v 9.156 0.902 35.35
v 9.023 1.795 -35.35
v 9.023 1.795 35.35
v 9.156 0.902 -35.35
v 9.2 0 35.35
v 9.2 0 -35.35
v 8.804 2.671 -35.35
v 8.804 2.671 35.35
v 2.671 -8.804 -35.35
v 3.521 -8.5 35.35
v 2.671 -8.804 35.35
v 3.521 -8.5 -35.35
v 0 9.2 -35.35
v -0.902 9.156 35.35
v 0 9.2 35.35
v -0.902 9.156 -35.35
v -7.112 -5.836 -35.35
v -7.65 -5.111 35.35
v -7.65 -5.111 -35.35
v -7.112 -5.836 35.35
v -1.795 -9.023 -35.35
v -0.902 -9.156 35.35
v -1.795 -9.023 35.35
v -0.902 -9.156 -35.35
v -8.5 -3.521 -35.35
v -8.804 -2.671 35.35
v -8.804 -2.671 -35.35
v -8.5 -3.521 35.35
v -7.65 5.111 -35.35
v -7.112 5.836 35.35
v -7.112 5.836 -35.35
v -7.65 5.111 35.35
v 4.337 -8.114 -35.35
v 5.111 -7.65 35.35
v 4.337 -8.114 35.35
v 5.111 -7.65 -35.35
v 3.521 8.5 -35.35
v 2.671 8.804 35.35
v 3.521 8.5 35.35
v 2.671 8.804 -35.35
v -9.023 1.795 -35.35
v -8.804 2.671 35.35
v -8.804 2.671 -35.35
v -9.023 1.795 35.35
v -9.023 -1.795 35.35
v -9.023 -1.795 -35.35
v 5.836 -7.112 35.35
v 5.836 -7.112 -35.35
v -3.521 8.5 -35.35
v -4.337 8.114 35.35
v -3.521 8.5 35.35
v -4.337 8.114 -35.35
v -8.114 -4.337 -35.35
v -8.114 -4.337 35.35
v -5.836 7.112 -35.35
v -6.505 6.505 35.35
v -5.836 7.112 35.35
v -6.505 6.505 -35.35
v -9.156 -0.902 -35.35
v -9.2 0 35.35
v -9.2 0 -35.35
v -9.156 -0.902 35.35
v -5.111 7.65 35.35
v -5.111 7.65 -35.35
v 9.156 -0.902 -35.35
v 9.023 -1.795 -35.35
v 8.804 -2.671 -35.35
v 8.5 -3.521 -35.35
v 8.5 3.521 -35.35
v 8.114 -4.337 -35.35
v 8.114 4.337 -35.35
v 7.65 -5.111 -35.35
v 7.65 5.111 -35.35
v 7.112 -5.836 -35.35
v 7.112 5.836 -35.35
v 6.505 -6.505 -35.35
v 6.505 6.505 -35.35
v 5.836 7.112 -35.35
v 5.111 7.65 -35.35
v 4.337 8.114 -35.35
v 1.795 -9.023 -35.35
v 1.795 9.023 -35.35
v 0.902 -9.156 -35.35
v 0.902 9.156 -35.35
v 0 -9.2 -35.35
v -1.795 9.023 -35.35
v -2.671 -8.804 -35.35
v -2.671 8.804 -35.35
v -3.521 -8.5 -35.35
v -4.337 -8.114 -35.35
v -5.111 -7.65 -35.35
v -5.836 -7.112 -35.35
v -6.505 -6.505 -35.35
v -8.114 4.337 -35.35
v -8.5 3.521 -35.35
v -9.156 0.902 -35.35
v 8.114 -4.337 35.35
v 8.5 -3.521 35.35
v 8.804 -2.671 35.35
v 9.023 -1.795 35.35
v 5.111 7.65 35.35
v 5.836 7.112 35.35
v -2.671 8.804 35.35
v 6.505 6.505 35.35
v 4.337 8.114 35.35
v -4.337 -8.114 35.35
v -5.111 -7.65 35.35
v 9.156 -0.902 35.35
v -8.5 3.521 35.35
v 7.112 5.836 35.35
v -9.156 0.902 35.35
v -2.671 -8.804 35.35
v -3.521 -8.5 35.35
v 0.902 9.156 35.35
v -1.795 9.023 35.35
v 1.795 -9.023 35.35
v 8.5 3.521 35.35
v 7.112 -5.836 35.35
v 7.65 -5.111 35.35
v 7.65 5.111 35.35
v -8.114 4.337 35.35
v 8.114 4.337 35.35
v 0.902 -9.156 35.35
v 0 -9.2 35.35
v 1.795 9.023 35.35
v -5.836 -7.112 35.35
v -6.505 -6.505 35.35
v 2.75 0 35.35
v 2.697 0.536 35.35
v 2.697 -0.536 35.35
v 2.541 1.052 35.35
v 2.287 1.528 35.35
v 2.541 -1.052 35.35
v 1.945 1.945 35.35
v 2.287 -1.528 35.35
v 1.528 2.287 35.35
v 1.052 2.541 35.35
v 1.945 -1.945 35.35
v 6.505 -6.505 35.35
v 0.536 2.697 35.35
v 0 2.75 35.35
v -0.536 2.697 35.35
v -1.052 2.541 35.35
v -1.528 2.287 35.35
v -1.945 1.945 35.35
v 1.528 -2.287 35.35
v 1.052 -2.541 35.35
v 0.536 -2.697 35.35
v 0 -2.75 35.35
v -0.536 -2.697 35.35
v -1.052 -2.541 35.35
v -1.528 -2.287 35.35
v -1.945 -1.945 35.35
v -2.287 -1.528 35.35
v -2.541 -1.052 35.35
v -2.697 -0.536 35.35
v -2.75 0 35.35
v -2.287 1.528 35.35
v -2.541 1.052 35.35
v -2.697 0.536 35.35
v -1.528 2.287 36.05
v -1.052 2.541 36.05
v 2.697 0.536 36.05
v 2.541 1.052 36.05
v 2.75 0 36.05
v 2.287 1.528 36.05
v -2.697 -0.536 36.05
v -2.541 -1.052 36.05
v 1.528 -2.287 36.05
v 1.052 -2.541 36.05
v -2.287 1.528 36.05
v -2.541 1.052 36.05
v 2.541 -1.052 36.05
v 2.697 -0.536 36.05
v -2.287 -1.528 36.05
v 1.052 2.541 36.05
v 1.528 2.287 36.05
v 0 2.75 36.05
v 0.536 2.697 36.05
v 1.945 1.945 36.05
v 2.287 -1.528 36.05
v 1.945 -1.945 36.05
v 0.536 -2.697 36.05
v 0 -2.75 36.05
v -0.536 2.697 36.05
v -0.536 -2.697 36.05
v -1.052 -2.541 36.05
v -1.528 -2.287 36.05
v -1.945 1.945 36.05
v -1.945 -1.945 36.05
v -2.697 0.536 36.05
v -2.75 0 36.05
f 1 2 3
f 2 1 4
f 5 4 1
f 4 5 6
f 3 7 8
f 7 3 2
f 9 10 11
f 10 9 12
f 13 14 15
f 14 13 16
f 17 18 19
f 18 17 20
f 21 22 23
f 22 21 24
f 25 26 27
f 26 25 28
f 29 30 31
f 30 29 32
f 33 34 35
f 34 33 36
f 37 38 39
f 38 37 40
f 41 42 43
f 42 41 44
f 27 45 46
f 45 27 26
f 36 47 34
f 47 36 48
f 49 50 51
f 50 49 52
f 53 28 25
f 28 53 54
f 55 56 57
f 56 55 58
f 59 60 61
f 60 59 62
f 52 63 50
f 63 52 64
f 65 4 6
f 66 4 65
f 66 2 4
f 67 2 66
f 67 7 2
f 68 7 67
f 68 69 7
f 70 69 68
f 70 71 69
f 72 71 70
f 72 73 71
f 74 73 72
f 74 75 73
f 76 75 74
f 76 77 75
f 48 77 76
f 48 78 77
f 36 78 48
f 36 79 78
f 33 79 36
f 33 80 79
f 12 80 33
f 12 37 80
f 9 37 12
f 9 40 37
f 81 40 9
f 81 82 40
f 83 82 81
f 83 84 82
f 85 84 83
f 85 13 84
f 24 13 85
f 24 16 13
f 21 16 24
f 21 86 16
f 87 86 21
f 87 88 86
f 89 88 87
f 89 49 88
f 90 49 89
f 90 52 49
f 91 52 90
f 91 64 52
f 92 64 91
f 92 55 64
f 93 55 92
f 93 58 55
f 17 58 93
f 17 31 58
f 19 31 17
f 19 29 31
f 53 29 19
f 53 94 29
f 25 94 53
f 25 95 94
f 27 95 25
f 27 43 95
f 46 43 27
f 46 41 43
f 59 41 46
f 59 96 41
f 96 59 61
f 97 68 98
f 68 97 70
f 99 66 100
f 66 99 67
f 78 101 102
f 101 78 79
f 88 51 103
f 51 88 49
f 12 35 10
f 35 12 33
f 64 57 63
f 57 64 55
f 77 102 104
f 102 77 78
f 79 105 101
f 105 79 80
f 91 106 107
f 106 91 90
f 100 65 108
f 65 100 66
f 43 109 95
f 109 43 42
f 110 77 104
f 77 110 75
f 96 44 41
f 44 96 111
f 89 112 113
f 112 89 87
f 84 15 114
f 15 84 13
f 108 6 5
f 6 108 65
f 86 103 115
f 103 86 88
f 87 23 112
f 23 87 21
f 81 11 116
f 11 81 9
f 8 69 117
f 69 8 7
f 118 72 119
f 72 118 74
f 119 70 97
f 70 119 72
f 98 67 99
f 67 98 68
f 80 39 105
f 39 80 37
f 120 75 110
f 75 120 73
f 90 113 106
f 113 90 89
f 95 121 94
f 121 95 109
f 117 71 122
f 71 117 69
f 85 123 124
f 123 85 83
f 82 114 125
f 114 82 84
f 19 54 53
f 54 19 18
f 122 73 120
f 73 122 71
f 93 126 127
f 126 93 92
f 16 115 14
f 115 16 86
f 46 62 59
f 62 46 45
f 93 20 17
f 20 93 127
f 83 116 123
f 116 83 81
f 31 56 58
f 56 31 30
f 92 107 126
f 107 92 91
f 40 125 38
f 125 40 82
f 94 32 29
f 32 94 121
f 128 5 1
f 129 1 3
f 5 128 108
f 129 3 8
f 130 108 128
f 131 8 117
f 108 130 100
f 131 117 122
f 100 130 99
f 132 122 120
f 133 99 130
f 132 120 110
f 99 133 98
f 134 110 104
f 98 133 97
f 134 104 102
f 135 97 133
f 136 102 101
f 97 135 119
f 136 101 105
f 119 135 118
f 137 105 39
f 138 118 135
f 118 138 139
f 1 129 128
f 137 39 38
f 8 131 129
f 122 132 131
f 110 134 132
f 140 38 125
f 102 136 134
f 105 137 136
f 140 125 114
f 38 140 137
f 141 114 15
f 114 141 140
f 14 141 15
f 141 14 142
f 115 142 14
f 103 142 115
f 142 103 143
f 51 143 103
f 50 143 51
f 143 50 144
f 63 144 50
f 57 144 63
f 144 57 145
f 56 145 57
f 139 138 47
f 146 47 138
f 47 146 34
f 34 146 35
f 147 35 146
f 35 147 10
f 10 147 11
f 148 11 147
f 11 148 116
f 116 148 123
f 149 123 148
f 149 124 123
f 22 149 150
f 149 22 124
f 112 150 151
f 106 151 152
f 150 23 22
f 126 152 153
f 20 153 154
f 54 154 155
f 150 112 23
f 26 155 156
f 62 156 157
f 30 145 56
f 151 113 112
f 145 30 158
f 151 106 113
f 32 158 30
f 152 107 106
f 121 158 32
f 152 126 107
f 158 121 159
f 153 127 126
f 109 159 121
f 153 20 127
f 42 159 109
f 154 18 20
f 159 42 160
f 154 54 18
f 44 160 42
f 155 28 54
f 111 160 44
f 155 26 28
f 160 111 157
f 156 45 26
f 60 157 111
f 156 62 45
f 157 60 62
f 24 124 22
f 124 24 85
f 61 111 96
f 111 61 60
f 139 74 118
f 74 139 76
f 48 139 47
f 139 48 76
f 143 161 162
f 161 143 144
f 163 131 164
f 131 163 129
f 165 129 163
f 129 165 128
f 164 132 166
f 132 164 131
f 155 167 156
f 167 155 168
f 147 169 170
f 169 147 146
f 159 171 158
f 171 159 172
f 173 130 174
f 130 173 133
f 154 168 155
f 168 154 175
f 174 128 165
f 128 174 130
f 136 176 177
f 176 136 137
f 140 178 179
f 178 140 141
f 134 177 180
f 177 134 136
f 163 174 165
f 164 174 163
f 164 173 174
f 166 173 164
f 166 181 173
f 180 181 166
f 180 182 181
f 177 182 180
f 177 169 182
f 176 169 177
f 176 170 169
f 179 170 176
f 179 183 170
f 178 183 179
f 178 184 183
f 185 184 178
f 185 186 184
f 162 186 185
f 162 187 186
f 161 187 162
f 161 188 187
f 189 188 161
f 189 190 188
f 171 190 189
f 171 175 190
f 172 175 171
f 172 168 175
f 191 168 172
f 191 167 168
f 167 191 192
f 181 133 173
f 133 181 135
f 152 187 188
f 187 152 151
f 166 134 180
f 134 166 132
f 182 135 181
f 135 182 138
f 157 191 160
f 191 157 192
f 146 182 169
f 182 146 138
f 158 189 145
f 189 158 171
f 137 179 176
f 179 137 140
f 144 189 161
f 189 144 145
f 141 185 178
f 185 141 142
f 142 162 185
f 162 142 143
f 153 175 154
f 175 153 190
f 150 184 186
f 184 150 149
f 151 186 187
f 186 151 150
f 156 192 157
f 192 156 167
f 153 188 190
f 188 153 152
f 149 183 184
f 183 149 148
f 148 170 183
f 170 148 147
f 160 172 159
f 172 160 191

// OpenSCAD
// Parameters
height_mm = 70.7; //[35.35:141.4:0.1]
diameter_mm = 18.4; //[9.2:36.8:0.1]
positive_terminal_diameter_mm = 5.5; //[2.75:11:0.1]
positive_terminal_height_mm = 1.5; //[0.75:3:0.1]
negative_terminal_diameter_mm = 6; //[3:12:0.1]
negative_terminal_height_mm = 0.3; //[0.15:0.6:0.05]
overlap_mm = 0.8; //[0.5:2:0.1]

// Battery cell body
module battery_cell_body() {
  color("DimGray") {
    cylinder(h=height_mm, r=diameter_mm/2, center=true, $fn=64);
  }
}

// Positive terminal button
module positive_terminal_button() {
  color("Silver") {
    translate([0, 0, height_mm/2 + positive_terminal_height_mm/2 - overlap_mm])
      cylinder(h=positive_terminal_height_mm, r=positive_terminal_diameter_mm/2, center=true, $fn=32);
  }
}

// Negative terminal contact
module negative_terminal_contact() {
  color("Silver") {
    translate([0, 0, -height_mm/2 - negative_terminal_height_mm/2 + overlap_mm])
      cylinder(h=negative_terminal_height_mm, r=negative_terminal_diameter_mm/2, center=true, $fn=32);
  }
}

// Complete battery assembly
module battery() {
  union() {
    battery_cell_body();
    positive_terminal_button();
    negative_terminal_contact();
  }
}

// Final assembly
module assembly() {
  battery();
}

assembly();
